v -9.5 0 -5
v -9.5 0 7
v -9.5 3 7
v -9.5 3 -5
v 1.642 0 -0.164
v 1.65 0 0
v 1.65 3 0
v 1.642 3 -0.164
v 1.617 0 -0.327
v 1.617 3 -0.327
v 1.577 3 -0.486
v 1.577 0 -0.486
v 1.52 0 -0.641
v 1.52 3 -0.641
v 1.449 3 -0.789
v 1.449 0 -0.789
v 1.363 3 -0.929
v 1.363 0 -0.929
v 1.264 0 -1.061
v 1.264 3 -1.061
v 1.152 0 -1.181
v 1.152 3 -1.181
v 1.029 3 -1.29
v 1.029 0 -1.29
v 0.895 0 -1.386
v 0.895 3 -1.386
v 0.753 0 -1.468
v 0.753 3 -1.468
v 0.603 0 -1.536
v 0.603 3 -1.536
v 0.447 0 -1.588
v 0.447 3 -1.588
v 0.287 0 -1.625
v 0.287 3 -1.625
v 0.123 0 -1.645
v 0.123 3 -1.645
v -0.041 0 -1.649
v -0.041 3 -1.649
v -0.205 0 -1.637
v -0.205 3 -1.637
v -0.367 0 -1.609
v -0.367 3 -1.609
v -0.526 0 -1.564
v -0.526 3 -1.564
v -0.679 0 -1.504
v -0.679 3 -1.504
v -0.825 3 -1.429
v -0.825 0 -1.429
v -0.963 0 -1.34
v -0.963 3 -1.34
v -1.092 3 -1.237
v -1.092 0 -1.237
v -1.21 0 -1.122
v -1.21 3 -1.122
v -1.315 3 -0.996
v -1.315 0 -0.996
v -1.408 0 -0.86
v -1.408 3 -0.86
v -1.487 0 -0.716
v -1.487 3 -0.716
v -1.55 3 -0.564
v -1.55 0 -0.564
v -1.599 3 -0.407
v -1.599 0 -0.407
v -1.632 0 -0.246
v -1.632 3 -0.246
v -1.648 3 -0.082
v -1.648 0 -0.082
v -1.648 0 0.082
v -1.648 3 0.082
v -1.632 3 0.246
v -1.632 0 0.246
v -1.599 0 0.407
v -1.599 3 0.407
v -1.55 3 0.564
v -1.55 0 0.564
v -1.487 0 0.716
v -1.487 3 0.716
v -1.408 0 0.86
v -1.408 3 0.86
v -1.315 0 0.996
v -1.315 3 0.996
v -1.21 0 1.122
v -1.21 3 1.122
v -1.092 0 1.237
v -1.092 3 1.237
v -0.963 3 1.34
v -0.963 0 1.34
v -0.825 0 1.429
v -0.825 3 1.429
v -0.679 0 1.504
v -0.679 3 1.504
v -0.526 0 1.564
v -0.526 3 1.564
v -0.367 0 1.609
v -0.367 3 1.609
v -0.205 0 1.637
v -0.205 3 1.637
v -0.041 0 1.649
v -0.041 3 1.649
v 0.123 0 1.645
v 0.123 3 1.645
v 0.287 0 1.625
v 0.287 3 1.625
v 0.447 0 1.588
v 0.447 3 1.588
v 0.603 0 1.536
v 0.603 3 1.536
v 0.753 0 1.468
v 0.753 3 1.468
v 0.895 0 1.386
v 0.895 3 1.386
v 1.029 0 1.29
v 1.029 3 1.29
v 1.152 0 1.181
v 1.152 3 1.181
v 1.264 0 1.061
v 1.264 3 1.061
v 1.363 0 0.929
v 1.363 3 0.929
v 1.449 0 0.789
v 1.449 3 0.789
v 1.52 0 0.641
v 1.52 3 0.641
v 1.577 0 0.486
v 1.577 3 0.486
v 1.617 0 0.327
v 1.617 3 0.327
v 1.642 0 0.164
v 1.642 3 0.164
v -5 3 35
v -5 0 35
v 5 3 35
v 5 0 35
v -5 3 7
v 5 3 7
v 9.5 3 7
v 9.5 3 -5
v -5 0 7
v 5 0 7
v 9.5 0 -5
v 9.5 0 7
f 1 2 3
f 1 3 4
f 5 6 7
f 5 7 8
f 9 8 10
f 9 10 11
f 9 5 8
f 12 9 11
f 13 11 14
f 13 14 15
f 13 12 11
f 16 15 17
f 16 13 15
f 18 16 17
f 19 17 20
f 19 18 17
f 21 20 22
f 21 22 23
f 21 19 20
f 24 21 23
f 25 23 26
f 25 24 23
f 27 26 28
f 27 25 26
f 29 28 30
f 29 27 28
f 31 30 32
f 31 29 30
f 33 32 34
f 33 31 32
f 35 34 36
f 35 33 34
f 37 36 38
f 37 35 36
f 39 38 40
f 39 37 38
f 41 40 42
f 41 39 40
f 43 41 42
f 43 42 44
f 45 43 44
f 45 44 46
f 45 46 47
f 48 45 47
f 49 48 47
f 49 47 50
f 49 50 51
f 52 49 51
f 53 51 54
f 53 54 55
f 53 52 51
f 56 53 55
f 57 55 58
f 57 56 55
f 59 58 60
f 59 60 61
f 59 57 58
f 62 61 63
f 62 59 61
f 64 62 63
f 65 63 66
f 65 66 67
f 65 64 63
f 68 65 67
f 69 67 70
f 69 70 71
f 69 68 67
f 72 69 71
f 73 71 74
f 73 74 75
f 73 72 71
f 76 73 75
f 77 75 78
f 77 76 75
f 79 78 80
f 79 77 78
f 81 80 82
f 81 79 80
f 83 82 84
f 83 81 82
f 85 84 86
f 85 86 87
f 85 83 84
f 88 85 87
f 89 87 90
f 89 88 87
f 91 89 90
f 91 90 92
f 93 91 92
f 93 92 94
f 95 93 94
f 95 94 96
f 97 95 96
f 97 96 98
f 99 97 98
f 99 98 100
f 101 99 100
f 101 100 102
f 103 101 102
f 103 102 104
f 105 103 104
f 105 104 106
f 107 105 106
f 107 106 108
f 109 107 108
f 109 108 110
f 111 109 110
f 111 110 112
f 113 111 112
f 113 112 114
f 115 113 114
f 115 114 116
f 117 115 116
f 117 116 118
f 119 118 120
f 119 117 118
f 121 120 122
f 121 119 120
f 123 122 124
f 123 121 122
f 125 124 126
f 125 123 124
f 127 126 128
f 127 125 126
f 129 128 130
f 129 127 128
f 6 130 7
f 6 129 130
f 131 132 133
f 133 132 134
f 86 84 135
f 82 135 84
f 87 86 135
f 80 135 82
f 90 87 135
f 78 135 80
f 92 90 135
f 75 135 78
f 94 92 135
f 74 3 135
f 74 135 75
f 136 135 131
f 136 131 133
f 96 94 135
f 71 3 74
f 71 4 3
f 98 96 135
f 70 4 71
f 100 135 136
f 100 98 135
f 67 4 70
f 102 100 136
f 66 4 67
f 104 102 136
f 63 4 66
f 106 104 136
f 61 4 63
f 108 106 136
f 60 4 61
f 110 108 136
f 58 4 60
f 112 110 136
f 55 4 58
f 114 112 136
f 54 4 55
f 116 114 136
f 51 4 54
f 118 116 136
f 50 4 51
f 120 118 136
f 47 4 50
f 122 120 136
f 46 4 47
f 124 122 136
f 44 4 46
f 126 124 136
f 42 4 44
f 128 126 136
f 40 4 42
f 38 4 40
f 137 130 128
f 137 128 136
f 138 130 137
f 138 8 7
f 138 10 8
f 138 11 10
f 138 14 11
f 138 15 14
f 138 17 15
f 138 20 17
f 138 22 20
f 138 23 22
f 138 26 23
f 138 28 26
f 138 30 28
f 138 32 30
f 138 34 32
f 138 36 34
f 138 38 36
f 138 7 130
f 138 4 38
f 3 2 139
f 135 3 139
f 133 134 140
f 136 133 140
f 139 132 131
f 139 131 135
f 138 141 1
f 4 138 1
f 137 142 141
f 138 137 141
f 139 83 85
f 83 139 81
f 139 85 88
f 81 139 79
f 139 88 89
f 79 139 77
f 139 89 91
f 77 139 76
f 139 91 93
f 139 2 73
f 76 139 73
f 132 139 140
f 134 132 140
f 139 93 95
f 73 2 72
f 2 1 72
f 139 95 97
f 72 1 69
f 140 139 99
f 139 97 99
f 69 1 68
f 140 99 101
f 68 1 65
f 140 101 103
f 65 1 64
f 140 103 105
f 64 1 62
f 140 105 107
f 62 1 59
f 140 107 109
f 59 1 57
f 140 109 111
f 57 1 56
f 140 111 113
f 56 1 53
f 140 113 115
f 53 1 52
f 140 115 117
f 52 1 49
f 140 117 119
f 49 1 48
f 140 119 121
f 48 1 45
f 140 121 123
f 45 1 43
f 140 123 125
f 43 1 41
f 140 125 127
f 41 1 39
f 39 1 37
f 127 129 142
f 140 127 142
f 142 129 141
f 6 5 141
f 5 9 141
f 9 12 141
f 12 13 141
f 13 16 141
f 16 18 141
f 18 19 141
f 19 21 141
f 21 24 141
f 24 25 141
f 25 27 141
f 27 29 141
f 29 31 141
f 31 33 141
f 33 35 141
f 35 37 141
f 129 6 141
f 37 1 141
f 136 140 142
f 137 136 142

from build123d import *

# Parameters (mm, degrees)
SKETCH1_W           = 10
SKETCH1_H           = 40
SKETCH1_R           = 1.65
SKETCH1_W_2         = 4.5
SKETCH1_H_2         = 12
BOSS_EXTRUDE1_DEPTH = 3


with BuildPart() as part:
    # Sketch1 → Boss-Extrude1 (new body)
    with BuildSketch(Plane(origin=(0, 0, 0), x_dir=(1, 0, 0), z_dir=(0, 1, 0))):
        with Locations((0, -15)):
            Rectangle(SKETCH1_W, SKETCH1_H)
        Circle(SKETCH1_R, mode=Mode.SUBTRACT)
        with Locations((-7.25, -1)):
            Rectangle(SKETCH1_W_2, SKETCH1_H_2)
        with Locations((7.25, -1)):
            Rectangle(SKETCH1_W_2, SKETCH1_H_2)
    extrude(amount=BOSS_EXTRUDE1_DEPTH)


solid = part.part
